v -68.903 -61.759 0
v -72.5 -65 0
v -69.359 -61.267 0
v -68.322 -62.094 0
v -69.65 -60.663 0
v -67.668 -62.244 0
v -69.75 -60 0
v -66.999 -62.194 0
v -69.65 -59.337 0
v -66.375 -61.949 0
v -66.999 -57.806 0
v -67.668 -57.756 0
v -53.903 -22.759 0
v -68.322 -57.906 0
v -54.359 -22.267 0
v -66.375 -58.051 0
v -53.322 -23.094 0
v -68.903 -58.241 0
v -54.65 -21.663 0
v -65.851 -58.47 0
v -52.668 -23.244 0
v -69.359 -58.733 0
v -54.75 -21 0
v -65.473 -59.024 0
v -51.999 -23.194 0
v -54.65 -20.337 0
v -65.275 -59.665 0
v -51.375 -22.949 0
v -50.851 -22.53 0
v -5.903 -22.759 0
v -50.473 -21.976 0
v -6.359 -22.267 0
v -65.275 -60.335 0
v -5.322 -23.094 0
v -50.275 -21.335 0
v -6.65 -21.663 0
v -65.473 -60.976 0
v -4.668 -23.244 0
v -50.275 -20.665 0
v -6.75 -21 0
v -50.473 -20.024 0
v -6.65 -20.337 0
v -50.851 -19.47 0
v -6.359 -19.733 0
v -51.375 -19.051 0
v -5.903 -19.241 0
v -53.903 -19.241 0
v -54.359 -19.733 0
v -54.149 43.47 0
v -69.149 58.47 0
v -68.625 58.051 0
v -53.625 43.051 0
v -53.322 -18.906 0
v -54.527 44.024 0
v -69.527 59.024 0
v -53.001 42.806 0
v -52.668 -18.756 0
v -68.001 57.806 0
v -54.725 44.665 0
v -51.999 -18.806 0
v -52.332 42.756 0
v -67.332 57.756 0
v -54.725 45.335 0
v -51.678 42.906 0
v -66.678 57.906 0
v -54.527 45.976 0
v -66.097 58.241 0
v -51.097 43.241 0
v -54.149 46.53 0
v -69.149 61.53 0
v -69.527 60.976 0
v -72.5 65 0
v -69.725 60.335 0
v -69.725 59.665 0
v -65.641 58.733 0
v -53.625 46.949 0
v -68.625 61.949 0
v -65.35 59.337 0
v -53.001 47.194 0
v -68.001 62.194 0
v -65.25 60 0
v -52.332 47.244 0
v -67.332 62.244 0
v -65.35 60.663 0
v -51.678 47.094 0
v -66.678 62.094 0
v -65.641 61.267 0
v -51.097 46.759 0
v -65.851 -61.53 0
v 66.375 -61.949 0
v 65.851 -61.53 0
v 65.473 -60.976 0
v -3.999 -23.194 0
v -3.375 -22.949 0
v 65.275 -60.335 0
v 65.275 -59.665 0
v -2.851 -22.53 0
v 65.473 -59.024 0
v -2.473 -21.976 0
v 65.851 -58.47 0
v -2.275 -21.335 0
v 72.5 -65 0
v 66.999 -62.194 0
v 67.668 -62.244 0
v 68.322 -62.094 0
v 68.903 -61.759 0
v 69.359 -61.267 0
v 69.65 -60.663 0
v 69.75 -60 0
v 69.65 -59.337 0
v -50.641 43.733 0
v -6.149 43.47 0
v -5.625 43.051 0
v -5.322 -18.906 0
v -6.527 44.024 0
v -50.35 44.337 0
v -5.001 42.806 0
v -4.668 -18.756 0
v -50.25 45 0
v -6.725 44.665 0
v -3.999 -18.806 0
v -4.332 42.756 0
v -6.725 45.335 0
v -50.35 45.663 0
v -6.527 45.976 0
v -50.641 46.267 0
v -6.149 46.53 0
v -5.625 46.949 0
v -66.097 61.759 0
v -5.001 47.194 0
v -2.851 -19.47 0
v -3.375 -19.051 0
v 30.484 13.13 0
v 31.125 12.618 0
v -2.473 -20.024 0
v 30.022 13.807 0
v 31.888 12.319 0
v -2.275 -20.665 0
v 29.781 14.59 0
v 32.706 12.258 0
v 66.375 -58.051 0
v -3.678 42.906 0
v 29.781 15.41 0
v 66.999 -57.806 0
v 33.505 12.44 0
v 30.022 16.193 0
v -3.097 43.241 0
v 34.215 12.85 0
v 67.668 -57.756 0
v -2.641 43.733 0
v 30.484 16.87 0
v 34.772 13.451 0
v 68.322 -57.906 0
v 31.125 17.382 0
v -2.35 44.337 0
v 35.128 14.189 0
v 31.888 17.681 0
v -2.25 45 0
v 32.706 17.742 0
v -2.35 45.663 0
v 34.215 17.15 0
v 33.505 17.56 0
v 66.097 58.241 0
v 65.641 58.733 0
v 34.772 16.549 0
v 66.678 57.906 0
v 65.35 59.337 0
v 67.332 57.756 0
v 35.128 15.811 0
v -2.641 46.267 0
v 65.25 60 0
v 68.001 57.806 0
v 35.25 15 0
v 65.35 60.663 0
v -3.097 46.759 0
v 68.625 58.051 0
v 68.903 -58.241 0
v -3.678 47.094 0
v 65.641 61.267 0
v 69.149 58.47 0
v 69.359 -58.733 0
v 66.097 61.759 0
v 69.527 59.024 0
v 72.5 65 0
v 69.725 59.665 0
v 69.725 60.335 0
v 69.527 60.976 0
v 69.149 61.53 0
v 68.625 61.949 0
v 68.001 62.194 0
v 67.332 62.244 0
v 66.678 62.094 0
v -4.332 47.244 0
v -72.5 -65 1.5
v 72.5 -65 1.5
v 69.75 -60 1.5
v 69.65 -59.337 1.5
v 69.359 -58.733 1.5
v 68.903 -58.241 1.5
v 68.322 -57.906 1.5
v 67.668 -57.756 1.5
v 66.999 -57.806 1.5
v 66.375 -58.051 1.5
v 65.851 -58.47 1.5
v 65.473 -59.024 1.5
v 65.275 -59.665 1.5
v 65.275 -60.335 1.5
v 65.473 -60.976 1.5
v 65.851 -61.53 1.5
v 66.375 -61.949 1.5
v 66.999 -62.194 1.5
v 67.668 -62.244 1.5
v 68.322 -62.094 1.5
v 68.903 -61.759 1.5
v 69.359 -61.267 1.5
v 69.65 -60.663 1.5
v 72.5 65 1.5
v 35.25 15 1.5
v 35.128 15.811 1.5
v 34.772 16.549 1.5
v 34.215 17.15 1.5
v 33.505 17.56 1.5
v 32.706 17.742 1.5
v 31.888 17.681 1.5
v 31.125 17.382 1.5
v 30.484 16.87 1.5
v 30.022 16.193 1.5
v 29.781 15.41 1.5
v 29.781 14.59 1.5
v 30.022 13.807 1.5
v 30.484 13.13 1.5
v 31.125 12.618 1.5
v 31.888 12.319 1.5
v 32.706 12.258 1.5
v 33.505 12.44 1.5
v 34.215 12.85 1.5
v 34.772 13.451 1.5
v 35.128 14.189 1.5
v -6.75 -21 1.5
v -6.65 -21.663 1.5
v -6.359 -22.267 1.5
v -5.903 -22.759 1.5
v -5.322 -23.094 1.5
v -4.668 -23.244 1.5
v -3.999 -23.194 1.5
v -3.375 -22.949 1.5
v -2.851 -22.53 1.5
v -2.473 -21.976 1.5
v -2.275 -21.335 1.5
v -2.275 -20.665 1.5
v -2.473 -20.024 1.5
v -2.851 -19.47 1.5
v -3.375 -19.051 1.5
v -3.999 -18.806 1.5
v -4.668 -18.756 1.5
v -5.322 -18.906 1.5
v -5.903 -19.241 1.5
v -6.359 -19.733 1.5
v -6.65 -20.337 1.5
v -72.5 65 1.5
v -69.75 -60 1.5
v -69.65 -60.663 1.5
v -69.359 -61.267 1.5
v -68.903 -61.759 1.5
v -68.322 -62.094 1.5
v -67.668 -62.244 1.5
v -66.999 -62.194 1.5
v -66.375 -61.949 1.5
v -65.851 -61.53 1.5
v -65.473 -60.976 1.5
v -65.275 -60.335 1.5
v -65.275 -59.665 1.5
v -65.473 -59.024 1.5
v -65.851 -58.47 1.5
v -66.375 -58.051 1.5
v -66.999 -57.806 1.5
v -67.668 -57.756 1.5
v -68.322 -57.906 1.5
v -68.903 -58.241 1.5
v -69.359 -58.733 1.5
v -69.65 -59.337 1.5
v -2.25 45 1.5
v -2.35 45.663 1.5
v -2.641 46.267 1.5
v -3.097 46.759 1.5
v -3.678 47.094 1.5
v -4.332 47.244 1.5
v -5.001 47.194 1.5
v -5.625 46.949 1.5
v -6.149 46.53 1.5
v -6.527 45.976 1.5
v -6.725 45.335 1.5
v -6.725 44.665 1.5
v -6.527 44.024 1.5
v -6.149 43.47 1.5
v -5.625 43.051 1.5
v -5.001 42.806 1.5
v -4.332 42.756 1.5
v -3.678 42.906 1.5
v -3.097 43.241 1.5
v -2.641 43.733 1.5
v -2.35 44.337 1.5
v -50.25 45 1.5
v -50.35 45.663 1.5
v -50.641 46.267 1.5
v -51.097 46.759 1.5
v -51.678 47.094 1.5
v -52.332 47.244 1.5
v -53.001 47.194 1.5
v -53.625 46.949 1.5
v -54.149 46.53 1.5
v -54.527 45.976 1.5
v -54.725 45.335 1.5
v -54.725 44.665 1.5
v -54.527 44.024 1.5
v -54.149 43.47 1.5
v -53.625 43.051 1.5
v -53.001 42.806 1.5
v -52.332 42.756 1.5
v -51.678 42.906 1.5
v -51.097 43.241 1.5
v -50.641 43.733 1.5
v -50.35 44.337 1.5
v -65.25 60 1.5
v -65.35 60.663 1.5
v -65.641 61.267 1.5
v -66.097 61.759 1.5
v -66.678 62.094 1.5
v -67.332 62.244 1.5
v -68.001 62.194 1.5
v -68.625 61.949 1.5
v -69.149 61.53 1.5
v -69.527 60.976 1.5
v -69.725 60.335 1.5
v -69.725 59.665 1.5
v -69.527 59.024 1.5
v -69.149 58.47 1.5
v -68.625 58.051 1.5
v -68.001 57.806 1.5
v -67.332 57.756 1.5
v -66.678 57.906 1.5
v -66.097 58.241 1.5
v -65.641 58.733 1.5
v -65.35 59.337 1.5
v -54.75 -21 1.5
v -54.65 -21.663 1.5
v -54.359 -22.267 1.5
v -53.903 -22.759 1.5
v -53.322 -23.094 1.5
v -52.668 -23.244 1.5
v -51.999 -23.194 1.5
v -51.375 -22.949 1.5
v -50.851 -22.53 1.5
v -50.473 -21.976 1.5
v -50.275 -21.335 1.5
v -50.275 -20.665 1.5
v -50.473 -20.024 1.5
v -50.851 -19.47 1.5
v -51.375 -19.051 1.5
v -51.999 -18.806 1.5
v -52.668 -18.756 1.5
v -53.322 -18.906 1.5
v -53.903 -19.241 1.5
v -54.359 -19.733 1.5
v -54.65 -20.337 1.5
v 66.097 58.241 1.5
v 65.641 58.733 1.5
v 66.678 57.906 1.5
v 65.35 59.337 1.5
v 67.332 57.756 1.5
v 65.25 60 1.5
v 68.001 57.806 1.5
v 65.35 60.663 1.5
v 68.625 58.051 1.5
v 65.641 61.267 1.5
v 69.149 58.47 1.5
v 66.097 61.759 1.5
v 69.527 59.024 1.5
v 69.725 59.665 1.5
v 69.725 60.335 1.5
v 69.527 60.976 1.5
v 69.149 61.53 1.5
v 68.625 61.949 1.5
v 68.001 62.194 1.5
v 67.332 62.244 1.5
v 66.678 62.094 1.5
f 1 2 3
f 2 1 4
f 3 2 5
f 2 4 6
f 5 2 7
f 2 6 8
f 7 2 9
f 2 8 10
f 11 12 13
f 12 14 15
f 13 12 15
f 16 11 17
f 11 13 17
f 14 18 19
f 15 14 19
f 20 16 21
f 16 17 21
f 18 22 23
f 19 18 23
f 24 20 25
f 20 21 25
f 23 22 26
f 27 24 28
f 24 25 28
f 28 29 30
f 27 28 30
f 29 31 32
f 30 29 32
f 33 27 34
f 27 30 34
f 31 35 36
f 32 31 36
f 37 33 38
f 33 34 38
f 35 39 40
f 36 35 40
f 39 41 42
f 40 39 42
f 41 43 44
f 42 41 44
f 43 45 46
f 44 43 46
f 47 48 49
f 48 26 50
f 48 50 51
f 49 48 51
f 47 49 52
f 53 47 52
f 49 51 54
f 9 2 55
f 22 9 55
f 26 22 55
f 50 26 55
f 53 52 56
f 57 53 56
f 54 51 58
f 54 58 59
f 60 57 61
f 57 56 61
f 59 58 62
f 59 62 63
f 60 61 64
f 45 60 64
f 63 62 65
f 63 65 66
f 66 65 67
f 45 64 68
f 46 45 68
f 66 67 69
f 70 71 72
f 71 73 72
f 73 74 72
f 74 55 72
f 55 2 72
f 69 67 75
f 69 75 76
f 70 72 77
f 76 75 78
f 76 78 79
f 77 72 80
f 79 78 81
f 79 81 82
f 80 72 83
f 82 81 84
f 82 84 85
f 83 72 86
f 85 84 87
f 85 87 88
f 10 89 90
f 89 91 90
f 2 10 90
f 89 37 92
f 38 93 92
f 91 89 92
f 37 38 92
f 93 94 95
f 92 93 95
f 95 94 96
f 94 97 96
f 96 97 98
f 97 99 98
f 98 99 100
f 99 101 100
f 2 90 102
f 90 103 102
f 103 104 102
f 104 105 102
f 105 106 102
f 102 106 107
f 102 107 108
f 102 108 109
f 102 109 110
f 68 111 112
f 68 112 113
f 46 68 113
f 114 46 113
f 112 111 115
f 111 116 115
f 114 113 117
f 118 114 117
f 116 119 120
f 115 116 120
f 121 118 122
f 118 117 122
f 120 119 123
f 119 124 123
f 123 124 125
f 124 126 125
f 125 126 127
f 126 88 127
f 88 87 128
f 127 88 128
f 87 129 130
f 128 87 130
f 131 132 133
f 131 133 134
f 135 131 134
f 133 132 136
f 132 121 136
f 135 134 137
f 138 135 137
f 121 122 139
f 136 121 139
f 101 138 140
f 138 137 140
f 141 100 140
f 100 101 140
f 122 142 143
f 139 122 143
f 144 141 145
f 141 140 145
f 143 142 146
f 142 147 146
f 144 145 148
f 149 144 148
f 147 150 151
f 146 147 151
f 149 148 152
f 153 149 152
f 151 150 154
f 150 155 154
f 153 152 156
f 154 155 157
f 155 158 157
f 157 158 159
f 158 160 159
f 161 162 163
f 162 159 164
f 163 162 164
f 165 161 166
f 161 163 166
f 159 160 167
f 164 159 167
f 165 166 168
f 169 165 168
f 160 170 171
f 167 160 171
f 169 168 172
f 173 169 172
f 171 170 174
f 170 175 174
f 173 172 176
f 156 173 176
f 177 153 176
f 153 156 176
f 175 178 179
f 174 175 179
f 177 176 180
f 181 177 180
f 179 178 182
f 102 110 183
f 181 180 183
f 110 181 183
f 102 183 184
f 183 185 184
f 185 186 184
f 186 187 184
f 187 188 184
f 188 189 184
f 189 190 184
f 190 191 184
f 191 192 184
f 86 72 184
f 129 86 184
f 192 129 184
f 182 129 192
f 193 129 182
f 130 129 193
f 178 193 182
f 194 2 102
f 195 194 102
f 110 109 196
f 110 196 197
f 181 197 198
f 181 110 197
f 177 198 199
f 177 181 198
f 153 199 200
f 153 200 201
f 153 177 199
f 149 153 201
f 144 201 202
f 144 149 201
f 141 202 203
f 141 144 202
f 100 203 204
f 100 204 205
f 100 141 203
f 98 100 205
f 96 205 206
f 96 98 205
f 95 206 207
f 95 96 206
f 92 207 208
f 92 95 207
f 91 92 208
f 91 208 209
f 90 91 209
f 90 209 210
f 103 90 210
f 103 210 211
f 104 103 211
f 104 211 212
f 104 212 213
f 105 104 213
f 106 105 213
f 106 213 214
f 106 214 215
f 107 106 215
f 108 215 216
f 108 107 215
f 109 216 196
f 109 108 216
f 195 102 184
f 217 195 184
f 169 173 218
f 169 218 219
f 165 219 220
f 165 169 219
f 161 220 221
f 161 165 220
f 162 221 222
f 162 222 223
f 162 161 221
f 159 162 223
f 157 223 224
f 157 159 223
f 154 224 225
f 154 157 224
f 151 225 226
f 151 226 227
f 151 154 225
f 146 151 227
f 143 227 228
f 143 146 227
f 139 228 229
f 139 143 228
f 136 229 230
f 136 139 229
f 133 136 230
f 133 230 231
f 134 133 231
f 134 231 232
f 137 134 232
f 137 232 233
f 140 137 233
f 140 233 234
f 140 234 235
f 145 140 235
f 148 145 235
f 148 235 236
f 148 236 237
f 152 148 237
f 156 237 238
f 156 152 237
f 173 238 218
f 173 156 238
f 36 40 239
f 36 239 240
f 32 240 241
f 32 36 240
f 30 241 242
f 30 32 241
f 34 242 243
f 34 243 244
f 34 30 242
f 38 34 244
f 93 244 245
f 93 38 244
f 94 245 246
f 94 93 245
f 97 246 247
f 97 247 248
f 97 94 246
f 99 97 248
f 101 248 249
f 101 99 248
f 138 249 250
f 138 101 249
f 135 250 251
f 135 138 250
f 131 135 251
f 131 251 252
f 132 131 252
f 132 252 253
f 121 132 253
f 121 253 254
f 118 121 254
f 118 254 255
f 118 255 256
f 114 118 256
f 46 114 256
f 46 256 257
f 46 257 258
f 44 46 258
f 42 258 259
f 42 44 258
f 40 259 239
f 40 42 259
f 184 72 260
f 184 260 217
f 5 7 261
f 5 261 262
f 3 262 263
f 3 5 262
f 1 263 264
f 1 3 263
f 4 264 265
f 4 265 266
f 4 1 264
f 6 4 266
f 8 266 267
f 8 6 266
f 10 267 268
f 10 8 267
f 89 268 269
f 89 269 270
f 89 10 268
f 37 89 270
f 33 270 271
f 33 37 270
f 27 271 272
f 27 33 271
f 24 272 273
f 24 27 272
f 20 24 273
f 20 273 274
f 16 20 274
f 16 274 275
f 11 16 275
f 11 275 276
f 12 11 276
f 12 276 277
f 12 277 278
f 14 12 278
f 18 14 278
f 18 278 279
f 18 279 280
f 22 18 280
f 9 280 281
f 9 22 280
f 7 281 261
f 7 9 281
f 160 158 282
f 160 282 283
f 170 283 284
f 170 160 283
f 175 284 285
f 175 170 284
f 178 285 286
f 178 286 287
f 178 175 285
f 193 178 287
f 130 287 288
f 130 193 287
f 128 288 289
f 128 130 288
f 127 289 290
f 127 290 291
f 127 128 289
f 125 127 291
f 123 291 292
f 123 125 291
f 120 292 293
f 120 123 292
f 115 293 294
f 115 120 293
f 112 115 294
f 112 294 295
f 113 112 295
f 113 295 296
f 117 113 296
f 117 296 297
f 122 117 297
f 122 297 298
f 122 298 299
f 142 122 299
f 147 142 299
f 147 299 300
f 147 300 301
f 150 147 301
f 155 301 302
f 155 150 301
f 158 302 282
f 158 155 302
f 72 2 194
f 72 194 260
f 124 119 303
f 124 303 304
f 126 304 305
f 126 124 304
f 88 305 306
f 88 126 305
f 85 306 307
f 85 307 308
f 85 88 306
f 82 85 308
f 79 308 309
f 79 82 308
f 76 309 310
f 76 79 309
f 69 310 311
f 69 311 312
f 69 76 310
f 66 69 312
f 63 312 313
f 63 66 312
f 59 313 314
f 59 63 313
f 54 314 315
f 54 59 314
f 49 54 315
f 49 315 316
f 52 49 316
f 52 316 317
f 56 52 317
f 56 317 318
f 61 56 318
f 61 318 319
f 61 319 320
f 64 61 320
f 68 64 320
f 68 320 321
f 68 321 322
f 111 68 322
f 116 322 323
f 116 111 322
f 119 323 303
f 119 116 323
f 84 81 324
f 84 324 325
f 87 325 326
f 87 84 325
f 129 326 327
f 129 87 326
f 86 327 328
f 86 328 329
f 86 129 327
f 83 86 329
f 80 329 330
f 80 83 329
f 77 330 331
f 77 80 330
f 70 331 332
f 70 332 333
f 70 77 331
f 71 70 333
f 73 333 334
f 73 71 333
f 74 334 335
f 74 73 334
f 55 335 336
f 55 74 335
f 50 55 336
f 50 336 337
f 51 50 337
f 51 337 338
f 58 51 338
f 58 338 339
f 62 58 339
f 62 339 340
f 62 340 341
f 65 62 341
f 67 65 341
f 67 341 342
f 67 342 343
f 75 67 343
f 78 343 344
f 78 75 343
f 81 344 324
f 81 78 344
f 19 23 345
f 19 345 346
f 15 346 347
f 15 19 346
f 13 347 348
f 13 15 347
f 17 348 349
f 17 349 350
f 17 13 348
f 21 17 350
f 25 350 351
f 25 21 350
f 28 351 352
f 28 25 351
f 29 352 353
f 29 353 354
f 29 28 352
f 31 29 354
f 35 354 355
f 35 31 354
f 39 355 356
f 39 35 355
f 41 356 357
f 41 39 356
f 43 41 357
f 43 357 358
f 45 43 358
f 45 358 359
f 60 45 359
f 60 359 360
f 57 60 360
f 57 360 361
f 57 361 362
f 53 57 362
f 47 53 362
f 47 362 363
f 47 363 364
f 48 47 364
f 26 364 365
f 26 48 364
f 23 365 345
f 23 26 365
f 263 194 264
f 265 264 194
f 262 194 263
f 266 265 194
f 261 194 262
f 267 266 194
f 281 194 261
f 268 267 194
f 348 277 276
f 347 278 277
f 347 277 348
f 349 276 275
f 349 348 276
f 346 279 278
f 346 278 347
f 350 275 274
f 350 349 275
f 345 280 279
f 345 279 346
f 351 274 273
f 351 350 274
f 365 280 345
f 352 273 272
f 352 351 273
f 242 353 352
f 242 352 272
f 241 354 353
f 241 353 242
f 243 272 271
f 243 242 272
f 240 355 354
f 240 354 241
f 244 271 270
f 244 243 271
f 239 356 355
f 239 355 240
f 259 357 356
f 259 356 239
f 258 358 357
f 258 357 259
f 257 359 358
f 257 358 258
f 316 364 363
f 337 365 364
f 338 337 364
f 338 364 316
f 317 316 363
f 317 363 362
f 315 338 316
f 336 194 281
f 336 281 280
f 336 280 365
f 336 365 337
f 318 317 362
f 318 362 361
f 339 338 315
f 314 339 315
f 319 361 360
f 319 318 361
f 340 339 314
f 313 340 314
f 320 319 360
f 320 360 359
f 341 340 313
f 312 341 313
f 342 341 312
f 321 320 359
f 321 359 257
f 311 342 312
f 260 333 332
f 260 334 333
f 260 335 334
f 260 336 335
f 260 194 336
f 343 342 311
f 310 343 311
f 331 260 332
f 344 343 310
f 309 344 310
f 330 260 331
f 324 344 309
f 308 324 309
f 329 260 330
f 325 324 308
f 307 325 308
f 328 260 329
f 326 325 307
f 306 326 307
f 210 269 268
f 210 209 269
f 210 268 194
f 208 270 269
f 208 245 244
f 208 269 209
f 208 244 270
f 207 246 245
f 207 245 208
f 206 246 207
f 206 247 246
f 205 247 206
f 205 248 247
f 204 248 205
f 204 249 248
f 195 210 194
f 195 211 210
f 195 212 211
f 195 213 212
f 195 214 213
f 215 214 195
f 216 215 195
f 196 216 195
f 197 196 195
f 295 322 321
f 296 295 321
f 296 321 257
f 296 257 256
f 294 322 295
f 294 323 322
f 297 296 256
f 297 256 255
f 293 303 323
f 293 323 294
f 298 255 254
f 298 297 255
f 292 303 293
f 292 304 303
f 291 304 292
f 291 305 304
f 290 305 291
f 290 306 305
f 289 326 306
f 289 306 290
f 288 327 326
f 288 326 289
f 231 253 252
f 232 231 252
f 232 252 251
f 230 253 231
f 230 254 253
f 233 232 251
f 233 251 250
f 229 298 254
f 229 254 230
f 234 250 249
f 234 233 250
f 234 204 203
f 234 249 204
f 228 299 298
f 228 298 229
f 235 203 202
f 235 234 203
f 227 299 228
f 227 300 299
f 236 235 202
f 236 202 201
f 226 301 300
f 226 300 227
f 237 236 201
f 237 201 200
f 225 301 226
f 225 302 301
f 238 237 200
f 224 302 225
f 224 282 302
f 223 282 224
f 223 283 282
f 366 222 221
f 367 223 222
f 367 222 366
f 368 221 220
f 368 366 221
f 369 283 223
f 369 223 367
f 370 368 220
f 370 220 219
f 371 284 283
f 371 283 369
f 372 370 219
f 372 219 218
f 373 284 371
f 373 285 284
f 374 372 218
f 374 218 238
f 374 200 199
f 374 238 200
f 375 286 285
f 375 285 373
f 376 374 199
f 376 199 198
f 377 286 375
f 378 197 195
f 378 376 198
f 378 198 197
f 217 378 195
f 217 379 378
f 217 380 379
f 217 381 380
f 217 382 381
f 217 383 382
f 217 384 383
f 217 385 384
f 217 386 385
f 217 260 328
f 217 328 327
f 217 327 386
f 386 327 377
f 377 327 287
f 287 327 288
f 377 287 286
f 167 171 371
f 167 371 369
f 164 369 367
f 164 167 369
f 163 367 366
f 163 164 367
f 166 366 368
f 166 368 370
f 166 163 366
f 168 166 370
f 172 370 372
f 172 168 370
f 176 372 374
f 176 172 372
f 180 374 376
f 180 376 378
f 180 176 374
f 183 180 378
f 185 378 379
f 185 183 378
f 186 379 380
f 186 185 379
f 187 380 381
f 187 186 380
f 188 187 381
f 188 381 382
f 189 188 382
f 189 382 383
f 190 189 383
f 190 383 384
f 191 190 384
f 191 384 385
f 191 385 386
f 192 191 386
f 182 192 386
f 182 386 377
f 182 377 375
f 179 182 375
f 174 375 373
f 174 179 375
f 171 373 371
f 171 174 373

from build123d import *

# Parameters (mm, degrees)
SKETCH_1_W      = 145
SKETCH_1_H      = 130
SKETCH_1_R      = 2.25
SKETCH_1_R_2    = 2.75
EXTRUDE_1_DEPTH = 1.5


with BuildPart() as part:
    # Эскиз1 → Вытянуть1 (new body)
    with BuildSketch(Plane.XY):
        Rectangle(SKETCH_1_W, SKETCH_1_H)
        with Locations((-67.5, 60)):
            Circle(SKETCH_1_R, mode=Mode.SUBTRACT)
        with Locations(Location((-67.5, -60, 0), (0, 0, 180))):
            Circle(SKETCH_1_R, mode=Mode.SUBTRACT)
        with Locations((67.5, -60)):
            Circle(SKETCH_1_R, mode=Mode.SUBTRACT)
        with Locations(Location((67.5, 60, 0), (0, 0, 180))):
            Circle(SKETCH_1_R, mode=Mode.SUBTRACT)
        with Locations((-52.5, 45)):
            Circle(SKETCH_1_R, mode=Mode.SUBTRACT)
        with Locations(Location((-52.5, -21, 0), (0, 0, 180))):
            Circle(SKETCH_1_R, mode=Mode.SUBTRACT)
        with Locations((-4.5, 45)):
            Circle(SKETCH_1_R, mode=Mode.SUBTRACT)
        with Locations(Location((-4.5, -21, 0), (0, 0, 180))):
            Circle(SKETCH_1_R, mode=Mode.SUBTRACT)
        with Locations((32.5, 15)):
            Circle(SKETCH_1_R_2, mode=Mode.SUBTRACT)
    extrude(amount=EXTRUDE_1_DEPTH)


solid = part.part
